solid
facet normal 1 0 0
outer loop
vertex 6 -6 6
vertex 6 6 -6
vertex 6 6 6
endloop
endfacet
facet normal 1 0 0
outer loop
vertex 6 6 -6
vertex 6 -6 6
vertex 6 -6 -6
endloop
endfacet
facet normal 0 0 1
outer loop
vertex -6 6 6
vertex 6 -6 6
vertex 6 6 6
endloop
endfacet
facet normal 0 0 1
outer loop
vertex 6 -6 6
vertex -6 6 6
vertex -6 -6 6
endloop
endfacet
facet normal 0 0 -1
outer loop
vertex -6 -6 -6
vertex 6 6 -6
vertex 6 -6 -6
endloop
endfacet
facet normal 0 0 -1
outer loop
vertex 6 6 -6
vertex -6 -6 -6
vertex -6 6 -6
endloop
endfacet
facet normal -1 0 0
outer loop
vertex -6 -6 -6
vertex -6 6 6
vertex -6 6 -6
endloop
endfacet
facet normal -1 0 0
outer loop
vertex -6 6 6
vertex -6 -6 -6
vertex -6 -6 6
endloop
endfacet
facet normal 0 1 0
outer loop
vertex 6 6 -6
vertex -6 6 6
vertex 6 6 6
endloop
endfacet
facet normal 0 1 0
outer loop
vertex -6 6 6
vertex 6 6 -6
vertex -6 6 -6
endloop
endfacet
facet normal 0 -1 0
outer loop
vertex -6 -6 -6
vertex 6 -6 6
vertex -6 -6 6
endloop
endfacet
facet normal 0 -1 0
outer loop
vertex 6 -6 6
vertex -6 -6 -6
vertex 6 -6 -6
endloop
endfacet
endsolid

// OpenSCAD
module number(num,c="gray"){
    color(c)
    text(num);
}

module magic_cube(){    
    difference(){
    color("yellow")
    cube(12,center=true);

    translate([-4,-5,6])
    number("1");

    translate([4,-5,-6])
    rotate([0,180,0])
    number("2");

    translate([-3,-5.8,-5])
    rotate([90,0,0])
    number("3");

    translate([4,6,-5])
    rotate([90,0,180])
    number("4");

    translate([6,-4,3])
    rotate([0,90,0])
    number("5");

    translate([-5.5,-5,-4])
    rotate([0,-90,0])
    number("6");
    }
}

magic_cube();
